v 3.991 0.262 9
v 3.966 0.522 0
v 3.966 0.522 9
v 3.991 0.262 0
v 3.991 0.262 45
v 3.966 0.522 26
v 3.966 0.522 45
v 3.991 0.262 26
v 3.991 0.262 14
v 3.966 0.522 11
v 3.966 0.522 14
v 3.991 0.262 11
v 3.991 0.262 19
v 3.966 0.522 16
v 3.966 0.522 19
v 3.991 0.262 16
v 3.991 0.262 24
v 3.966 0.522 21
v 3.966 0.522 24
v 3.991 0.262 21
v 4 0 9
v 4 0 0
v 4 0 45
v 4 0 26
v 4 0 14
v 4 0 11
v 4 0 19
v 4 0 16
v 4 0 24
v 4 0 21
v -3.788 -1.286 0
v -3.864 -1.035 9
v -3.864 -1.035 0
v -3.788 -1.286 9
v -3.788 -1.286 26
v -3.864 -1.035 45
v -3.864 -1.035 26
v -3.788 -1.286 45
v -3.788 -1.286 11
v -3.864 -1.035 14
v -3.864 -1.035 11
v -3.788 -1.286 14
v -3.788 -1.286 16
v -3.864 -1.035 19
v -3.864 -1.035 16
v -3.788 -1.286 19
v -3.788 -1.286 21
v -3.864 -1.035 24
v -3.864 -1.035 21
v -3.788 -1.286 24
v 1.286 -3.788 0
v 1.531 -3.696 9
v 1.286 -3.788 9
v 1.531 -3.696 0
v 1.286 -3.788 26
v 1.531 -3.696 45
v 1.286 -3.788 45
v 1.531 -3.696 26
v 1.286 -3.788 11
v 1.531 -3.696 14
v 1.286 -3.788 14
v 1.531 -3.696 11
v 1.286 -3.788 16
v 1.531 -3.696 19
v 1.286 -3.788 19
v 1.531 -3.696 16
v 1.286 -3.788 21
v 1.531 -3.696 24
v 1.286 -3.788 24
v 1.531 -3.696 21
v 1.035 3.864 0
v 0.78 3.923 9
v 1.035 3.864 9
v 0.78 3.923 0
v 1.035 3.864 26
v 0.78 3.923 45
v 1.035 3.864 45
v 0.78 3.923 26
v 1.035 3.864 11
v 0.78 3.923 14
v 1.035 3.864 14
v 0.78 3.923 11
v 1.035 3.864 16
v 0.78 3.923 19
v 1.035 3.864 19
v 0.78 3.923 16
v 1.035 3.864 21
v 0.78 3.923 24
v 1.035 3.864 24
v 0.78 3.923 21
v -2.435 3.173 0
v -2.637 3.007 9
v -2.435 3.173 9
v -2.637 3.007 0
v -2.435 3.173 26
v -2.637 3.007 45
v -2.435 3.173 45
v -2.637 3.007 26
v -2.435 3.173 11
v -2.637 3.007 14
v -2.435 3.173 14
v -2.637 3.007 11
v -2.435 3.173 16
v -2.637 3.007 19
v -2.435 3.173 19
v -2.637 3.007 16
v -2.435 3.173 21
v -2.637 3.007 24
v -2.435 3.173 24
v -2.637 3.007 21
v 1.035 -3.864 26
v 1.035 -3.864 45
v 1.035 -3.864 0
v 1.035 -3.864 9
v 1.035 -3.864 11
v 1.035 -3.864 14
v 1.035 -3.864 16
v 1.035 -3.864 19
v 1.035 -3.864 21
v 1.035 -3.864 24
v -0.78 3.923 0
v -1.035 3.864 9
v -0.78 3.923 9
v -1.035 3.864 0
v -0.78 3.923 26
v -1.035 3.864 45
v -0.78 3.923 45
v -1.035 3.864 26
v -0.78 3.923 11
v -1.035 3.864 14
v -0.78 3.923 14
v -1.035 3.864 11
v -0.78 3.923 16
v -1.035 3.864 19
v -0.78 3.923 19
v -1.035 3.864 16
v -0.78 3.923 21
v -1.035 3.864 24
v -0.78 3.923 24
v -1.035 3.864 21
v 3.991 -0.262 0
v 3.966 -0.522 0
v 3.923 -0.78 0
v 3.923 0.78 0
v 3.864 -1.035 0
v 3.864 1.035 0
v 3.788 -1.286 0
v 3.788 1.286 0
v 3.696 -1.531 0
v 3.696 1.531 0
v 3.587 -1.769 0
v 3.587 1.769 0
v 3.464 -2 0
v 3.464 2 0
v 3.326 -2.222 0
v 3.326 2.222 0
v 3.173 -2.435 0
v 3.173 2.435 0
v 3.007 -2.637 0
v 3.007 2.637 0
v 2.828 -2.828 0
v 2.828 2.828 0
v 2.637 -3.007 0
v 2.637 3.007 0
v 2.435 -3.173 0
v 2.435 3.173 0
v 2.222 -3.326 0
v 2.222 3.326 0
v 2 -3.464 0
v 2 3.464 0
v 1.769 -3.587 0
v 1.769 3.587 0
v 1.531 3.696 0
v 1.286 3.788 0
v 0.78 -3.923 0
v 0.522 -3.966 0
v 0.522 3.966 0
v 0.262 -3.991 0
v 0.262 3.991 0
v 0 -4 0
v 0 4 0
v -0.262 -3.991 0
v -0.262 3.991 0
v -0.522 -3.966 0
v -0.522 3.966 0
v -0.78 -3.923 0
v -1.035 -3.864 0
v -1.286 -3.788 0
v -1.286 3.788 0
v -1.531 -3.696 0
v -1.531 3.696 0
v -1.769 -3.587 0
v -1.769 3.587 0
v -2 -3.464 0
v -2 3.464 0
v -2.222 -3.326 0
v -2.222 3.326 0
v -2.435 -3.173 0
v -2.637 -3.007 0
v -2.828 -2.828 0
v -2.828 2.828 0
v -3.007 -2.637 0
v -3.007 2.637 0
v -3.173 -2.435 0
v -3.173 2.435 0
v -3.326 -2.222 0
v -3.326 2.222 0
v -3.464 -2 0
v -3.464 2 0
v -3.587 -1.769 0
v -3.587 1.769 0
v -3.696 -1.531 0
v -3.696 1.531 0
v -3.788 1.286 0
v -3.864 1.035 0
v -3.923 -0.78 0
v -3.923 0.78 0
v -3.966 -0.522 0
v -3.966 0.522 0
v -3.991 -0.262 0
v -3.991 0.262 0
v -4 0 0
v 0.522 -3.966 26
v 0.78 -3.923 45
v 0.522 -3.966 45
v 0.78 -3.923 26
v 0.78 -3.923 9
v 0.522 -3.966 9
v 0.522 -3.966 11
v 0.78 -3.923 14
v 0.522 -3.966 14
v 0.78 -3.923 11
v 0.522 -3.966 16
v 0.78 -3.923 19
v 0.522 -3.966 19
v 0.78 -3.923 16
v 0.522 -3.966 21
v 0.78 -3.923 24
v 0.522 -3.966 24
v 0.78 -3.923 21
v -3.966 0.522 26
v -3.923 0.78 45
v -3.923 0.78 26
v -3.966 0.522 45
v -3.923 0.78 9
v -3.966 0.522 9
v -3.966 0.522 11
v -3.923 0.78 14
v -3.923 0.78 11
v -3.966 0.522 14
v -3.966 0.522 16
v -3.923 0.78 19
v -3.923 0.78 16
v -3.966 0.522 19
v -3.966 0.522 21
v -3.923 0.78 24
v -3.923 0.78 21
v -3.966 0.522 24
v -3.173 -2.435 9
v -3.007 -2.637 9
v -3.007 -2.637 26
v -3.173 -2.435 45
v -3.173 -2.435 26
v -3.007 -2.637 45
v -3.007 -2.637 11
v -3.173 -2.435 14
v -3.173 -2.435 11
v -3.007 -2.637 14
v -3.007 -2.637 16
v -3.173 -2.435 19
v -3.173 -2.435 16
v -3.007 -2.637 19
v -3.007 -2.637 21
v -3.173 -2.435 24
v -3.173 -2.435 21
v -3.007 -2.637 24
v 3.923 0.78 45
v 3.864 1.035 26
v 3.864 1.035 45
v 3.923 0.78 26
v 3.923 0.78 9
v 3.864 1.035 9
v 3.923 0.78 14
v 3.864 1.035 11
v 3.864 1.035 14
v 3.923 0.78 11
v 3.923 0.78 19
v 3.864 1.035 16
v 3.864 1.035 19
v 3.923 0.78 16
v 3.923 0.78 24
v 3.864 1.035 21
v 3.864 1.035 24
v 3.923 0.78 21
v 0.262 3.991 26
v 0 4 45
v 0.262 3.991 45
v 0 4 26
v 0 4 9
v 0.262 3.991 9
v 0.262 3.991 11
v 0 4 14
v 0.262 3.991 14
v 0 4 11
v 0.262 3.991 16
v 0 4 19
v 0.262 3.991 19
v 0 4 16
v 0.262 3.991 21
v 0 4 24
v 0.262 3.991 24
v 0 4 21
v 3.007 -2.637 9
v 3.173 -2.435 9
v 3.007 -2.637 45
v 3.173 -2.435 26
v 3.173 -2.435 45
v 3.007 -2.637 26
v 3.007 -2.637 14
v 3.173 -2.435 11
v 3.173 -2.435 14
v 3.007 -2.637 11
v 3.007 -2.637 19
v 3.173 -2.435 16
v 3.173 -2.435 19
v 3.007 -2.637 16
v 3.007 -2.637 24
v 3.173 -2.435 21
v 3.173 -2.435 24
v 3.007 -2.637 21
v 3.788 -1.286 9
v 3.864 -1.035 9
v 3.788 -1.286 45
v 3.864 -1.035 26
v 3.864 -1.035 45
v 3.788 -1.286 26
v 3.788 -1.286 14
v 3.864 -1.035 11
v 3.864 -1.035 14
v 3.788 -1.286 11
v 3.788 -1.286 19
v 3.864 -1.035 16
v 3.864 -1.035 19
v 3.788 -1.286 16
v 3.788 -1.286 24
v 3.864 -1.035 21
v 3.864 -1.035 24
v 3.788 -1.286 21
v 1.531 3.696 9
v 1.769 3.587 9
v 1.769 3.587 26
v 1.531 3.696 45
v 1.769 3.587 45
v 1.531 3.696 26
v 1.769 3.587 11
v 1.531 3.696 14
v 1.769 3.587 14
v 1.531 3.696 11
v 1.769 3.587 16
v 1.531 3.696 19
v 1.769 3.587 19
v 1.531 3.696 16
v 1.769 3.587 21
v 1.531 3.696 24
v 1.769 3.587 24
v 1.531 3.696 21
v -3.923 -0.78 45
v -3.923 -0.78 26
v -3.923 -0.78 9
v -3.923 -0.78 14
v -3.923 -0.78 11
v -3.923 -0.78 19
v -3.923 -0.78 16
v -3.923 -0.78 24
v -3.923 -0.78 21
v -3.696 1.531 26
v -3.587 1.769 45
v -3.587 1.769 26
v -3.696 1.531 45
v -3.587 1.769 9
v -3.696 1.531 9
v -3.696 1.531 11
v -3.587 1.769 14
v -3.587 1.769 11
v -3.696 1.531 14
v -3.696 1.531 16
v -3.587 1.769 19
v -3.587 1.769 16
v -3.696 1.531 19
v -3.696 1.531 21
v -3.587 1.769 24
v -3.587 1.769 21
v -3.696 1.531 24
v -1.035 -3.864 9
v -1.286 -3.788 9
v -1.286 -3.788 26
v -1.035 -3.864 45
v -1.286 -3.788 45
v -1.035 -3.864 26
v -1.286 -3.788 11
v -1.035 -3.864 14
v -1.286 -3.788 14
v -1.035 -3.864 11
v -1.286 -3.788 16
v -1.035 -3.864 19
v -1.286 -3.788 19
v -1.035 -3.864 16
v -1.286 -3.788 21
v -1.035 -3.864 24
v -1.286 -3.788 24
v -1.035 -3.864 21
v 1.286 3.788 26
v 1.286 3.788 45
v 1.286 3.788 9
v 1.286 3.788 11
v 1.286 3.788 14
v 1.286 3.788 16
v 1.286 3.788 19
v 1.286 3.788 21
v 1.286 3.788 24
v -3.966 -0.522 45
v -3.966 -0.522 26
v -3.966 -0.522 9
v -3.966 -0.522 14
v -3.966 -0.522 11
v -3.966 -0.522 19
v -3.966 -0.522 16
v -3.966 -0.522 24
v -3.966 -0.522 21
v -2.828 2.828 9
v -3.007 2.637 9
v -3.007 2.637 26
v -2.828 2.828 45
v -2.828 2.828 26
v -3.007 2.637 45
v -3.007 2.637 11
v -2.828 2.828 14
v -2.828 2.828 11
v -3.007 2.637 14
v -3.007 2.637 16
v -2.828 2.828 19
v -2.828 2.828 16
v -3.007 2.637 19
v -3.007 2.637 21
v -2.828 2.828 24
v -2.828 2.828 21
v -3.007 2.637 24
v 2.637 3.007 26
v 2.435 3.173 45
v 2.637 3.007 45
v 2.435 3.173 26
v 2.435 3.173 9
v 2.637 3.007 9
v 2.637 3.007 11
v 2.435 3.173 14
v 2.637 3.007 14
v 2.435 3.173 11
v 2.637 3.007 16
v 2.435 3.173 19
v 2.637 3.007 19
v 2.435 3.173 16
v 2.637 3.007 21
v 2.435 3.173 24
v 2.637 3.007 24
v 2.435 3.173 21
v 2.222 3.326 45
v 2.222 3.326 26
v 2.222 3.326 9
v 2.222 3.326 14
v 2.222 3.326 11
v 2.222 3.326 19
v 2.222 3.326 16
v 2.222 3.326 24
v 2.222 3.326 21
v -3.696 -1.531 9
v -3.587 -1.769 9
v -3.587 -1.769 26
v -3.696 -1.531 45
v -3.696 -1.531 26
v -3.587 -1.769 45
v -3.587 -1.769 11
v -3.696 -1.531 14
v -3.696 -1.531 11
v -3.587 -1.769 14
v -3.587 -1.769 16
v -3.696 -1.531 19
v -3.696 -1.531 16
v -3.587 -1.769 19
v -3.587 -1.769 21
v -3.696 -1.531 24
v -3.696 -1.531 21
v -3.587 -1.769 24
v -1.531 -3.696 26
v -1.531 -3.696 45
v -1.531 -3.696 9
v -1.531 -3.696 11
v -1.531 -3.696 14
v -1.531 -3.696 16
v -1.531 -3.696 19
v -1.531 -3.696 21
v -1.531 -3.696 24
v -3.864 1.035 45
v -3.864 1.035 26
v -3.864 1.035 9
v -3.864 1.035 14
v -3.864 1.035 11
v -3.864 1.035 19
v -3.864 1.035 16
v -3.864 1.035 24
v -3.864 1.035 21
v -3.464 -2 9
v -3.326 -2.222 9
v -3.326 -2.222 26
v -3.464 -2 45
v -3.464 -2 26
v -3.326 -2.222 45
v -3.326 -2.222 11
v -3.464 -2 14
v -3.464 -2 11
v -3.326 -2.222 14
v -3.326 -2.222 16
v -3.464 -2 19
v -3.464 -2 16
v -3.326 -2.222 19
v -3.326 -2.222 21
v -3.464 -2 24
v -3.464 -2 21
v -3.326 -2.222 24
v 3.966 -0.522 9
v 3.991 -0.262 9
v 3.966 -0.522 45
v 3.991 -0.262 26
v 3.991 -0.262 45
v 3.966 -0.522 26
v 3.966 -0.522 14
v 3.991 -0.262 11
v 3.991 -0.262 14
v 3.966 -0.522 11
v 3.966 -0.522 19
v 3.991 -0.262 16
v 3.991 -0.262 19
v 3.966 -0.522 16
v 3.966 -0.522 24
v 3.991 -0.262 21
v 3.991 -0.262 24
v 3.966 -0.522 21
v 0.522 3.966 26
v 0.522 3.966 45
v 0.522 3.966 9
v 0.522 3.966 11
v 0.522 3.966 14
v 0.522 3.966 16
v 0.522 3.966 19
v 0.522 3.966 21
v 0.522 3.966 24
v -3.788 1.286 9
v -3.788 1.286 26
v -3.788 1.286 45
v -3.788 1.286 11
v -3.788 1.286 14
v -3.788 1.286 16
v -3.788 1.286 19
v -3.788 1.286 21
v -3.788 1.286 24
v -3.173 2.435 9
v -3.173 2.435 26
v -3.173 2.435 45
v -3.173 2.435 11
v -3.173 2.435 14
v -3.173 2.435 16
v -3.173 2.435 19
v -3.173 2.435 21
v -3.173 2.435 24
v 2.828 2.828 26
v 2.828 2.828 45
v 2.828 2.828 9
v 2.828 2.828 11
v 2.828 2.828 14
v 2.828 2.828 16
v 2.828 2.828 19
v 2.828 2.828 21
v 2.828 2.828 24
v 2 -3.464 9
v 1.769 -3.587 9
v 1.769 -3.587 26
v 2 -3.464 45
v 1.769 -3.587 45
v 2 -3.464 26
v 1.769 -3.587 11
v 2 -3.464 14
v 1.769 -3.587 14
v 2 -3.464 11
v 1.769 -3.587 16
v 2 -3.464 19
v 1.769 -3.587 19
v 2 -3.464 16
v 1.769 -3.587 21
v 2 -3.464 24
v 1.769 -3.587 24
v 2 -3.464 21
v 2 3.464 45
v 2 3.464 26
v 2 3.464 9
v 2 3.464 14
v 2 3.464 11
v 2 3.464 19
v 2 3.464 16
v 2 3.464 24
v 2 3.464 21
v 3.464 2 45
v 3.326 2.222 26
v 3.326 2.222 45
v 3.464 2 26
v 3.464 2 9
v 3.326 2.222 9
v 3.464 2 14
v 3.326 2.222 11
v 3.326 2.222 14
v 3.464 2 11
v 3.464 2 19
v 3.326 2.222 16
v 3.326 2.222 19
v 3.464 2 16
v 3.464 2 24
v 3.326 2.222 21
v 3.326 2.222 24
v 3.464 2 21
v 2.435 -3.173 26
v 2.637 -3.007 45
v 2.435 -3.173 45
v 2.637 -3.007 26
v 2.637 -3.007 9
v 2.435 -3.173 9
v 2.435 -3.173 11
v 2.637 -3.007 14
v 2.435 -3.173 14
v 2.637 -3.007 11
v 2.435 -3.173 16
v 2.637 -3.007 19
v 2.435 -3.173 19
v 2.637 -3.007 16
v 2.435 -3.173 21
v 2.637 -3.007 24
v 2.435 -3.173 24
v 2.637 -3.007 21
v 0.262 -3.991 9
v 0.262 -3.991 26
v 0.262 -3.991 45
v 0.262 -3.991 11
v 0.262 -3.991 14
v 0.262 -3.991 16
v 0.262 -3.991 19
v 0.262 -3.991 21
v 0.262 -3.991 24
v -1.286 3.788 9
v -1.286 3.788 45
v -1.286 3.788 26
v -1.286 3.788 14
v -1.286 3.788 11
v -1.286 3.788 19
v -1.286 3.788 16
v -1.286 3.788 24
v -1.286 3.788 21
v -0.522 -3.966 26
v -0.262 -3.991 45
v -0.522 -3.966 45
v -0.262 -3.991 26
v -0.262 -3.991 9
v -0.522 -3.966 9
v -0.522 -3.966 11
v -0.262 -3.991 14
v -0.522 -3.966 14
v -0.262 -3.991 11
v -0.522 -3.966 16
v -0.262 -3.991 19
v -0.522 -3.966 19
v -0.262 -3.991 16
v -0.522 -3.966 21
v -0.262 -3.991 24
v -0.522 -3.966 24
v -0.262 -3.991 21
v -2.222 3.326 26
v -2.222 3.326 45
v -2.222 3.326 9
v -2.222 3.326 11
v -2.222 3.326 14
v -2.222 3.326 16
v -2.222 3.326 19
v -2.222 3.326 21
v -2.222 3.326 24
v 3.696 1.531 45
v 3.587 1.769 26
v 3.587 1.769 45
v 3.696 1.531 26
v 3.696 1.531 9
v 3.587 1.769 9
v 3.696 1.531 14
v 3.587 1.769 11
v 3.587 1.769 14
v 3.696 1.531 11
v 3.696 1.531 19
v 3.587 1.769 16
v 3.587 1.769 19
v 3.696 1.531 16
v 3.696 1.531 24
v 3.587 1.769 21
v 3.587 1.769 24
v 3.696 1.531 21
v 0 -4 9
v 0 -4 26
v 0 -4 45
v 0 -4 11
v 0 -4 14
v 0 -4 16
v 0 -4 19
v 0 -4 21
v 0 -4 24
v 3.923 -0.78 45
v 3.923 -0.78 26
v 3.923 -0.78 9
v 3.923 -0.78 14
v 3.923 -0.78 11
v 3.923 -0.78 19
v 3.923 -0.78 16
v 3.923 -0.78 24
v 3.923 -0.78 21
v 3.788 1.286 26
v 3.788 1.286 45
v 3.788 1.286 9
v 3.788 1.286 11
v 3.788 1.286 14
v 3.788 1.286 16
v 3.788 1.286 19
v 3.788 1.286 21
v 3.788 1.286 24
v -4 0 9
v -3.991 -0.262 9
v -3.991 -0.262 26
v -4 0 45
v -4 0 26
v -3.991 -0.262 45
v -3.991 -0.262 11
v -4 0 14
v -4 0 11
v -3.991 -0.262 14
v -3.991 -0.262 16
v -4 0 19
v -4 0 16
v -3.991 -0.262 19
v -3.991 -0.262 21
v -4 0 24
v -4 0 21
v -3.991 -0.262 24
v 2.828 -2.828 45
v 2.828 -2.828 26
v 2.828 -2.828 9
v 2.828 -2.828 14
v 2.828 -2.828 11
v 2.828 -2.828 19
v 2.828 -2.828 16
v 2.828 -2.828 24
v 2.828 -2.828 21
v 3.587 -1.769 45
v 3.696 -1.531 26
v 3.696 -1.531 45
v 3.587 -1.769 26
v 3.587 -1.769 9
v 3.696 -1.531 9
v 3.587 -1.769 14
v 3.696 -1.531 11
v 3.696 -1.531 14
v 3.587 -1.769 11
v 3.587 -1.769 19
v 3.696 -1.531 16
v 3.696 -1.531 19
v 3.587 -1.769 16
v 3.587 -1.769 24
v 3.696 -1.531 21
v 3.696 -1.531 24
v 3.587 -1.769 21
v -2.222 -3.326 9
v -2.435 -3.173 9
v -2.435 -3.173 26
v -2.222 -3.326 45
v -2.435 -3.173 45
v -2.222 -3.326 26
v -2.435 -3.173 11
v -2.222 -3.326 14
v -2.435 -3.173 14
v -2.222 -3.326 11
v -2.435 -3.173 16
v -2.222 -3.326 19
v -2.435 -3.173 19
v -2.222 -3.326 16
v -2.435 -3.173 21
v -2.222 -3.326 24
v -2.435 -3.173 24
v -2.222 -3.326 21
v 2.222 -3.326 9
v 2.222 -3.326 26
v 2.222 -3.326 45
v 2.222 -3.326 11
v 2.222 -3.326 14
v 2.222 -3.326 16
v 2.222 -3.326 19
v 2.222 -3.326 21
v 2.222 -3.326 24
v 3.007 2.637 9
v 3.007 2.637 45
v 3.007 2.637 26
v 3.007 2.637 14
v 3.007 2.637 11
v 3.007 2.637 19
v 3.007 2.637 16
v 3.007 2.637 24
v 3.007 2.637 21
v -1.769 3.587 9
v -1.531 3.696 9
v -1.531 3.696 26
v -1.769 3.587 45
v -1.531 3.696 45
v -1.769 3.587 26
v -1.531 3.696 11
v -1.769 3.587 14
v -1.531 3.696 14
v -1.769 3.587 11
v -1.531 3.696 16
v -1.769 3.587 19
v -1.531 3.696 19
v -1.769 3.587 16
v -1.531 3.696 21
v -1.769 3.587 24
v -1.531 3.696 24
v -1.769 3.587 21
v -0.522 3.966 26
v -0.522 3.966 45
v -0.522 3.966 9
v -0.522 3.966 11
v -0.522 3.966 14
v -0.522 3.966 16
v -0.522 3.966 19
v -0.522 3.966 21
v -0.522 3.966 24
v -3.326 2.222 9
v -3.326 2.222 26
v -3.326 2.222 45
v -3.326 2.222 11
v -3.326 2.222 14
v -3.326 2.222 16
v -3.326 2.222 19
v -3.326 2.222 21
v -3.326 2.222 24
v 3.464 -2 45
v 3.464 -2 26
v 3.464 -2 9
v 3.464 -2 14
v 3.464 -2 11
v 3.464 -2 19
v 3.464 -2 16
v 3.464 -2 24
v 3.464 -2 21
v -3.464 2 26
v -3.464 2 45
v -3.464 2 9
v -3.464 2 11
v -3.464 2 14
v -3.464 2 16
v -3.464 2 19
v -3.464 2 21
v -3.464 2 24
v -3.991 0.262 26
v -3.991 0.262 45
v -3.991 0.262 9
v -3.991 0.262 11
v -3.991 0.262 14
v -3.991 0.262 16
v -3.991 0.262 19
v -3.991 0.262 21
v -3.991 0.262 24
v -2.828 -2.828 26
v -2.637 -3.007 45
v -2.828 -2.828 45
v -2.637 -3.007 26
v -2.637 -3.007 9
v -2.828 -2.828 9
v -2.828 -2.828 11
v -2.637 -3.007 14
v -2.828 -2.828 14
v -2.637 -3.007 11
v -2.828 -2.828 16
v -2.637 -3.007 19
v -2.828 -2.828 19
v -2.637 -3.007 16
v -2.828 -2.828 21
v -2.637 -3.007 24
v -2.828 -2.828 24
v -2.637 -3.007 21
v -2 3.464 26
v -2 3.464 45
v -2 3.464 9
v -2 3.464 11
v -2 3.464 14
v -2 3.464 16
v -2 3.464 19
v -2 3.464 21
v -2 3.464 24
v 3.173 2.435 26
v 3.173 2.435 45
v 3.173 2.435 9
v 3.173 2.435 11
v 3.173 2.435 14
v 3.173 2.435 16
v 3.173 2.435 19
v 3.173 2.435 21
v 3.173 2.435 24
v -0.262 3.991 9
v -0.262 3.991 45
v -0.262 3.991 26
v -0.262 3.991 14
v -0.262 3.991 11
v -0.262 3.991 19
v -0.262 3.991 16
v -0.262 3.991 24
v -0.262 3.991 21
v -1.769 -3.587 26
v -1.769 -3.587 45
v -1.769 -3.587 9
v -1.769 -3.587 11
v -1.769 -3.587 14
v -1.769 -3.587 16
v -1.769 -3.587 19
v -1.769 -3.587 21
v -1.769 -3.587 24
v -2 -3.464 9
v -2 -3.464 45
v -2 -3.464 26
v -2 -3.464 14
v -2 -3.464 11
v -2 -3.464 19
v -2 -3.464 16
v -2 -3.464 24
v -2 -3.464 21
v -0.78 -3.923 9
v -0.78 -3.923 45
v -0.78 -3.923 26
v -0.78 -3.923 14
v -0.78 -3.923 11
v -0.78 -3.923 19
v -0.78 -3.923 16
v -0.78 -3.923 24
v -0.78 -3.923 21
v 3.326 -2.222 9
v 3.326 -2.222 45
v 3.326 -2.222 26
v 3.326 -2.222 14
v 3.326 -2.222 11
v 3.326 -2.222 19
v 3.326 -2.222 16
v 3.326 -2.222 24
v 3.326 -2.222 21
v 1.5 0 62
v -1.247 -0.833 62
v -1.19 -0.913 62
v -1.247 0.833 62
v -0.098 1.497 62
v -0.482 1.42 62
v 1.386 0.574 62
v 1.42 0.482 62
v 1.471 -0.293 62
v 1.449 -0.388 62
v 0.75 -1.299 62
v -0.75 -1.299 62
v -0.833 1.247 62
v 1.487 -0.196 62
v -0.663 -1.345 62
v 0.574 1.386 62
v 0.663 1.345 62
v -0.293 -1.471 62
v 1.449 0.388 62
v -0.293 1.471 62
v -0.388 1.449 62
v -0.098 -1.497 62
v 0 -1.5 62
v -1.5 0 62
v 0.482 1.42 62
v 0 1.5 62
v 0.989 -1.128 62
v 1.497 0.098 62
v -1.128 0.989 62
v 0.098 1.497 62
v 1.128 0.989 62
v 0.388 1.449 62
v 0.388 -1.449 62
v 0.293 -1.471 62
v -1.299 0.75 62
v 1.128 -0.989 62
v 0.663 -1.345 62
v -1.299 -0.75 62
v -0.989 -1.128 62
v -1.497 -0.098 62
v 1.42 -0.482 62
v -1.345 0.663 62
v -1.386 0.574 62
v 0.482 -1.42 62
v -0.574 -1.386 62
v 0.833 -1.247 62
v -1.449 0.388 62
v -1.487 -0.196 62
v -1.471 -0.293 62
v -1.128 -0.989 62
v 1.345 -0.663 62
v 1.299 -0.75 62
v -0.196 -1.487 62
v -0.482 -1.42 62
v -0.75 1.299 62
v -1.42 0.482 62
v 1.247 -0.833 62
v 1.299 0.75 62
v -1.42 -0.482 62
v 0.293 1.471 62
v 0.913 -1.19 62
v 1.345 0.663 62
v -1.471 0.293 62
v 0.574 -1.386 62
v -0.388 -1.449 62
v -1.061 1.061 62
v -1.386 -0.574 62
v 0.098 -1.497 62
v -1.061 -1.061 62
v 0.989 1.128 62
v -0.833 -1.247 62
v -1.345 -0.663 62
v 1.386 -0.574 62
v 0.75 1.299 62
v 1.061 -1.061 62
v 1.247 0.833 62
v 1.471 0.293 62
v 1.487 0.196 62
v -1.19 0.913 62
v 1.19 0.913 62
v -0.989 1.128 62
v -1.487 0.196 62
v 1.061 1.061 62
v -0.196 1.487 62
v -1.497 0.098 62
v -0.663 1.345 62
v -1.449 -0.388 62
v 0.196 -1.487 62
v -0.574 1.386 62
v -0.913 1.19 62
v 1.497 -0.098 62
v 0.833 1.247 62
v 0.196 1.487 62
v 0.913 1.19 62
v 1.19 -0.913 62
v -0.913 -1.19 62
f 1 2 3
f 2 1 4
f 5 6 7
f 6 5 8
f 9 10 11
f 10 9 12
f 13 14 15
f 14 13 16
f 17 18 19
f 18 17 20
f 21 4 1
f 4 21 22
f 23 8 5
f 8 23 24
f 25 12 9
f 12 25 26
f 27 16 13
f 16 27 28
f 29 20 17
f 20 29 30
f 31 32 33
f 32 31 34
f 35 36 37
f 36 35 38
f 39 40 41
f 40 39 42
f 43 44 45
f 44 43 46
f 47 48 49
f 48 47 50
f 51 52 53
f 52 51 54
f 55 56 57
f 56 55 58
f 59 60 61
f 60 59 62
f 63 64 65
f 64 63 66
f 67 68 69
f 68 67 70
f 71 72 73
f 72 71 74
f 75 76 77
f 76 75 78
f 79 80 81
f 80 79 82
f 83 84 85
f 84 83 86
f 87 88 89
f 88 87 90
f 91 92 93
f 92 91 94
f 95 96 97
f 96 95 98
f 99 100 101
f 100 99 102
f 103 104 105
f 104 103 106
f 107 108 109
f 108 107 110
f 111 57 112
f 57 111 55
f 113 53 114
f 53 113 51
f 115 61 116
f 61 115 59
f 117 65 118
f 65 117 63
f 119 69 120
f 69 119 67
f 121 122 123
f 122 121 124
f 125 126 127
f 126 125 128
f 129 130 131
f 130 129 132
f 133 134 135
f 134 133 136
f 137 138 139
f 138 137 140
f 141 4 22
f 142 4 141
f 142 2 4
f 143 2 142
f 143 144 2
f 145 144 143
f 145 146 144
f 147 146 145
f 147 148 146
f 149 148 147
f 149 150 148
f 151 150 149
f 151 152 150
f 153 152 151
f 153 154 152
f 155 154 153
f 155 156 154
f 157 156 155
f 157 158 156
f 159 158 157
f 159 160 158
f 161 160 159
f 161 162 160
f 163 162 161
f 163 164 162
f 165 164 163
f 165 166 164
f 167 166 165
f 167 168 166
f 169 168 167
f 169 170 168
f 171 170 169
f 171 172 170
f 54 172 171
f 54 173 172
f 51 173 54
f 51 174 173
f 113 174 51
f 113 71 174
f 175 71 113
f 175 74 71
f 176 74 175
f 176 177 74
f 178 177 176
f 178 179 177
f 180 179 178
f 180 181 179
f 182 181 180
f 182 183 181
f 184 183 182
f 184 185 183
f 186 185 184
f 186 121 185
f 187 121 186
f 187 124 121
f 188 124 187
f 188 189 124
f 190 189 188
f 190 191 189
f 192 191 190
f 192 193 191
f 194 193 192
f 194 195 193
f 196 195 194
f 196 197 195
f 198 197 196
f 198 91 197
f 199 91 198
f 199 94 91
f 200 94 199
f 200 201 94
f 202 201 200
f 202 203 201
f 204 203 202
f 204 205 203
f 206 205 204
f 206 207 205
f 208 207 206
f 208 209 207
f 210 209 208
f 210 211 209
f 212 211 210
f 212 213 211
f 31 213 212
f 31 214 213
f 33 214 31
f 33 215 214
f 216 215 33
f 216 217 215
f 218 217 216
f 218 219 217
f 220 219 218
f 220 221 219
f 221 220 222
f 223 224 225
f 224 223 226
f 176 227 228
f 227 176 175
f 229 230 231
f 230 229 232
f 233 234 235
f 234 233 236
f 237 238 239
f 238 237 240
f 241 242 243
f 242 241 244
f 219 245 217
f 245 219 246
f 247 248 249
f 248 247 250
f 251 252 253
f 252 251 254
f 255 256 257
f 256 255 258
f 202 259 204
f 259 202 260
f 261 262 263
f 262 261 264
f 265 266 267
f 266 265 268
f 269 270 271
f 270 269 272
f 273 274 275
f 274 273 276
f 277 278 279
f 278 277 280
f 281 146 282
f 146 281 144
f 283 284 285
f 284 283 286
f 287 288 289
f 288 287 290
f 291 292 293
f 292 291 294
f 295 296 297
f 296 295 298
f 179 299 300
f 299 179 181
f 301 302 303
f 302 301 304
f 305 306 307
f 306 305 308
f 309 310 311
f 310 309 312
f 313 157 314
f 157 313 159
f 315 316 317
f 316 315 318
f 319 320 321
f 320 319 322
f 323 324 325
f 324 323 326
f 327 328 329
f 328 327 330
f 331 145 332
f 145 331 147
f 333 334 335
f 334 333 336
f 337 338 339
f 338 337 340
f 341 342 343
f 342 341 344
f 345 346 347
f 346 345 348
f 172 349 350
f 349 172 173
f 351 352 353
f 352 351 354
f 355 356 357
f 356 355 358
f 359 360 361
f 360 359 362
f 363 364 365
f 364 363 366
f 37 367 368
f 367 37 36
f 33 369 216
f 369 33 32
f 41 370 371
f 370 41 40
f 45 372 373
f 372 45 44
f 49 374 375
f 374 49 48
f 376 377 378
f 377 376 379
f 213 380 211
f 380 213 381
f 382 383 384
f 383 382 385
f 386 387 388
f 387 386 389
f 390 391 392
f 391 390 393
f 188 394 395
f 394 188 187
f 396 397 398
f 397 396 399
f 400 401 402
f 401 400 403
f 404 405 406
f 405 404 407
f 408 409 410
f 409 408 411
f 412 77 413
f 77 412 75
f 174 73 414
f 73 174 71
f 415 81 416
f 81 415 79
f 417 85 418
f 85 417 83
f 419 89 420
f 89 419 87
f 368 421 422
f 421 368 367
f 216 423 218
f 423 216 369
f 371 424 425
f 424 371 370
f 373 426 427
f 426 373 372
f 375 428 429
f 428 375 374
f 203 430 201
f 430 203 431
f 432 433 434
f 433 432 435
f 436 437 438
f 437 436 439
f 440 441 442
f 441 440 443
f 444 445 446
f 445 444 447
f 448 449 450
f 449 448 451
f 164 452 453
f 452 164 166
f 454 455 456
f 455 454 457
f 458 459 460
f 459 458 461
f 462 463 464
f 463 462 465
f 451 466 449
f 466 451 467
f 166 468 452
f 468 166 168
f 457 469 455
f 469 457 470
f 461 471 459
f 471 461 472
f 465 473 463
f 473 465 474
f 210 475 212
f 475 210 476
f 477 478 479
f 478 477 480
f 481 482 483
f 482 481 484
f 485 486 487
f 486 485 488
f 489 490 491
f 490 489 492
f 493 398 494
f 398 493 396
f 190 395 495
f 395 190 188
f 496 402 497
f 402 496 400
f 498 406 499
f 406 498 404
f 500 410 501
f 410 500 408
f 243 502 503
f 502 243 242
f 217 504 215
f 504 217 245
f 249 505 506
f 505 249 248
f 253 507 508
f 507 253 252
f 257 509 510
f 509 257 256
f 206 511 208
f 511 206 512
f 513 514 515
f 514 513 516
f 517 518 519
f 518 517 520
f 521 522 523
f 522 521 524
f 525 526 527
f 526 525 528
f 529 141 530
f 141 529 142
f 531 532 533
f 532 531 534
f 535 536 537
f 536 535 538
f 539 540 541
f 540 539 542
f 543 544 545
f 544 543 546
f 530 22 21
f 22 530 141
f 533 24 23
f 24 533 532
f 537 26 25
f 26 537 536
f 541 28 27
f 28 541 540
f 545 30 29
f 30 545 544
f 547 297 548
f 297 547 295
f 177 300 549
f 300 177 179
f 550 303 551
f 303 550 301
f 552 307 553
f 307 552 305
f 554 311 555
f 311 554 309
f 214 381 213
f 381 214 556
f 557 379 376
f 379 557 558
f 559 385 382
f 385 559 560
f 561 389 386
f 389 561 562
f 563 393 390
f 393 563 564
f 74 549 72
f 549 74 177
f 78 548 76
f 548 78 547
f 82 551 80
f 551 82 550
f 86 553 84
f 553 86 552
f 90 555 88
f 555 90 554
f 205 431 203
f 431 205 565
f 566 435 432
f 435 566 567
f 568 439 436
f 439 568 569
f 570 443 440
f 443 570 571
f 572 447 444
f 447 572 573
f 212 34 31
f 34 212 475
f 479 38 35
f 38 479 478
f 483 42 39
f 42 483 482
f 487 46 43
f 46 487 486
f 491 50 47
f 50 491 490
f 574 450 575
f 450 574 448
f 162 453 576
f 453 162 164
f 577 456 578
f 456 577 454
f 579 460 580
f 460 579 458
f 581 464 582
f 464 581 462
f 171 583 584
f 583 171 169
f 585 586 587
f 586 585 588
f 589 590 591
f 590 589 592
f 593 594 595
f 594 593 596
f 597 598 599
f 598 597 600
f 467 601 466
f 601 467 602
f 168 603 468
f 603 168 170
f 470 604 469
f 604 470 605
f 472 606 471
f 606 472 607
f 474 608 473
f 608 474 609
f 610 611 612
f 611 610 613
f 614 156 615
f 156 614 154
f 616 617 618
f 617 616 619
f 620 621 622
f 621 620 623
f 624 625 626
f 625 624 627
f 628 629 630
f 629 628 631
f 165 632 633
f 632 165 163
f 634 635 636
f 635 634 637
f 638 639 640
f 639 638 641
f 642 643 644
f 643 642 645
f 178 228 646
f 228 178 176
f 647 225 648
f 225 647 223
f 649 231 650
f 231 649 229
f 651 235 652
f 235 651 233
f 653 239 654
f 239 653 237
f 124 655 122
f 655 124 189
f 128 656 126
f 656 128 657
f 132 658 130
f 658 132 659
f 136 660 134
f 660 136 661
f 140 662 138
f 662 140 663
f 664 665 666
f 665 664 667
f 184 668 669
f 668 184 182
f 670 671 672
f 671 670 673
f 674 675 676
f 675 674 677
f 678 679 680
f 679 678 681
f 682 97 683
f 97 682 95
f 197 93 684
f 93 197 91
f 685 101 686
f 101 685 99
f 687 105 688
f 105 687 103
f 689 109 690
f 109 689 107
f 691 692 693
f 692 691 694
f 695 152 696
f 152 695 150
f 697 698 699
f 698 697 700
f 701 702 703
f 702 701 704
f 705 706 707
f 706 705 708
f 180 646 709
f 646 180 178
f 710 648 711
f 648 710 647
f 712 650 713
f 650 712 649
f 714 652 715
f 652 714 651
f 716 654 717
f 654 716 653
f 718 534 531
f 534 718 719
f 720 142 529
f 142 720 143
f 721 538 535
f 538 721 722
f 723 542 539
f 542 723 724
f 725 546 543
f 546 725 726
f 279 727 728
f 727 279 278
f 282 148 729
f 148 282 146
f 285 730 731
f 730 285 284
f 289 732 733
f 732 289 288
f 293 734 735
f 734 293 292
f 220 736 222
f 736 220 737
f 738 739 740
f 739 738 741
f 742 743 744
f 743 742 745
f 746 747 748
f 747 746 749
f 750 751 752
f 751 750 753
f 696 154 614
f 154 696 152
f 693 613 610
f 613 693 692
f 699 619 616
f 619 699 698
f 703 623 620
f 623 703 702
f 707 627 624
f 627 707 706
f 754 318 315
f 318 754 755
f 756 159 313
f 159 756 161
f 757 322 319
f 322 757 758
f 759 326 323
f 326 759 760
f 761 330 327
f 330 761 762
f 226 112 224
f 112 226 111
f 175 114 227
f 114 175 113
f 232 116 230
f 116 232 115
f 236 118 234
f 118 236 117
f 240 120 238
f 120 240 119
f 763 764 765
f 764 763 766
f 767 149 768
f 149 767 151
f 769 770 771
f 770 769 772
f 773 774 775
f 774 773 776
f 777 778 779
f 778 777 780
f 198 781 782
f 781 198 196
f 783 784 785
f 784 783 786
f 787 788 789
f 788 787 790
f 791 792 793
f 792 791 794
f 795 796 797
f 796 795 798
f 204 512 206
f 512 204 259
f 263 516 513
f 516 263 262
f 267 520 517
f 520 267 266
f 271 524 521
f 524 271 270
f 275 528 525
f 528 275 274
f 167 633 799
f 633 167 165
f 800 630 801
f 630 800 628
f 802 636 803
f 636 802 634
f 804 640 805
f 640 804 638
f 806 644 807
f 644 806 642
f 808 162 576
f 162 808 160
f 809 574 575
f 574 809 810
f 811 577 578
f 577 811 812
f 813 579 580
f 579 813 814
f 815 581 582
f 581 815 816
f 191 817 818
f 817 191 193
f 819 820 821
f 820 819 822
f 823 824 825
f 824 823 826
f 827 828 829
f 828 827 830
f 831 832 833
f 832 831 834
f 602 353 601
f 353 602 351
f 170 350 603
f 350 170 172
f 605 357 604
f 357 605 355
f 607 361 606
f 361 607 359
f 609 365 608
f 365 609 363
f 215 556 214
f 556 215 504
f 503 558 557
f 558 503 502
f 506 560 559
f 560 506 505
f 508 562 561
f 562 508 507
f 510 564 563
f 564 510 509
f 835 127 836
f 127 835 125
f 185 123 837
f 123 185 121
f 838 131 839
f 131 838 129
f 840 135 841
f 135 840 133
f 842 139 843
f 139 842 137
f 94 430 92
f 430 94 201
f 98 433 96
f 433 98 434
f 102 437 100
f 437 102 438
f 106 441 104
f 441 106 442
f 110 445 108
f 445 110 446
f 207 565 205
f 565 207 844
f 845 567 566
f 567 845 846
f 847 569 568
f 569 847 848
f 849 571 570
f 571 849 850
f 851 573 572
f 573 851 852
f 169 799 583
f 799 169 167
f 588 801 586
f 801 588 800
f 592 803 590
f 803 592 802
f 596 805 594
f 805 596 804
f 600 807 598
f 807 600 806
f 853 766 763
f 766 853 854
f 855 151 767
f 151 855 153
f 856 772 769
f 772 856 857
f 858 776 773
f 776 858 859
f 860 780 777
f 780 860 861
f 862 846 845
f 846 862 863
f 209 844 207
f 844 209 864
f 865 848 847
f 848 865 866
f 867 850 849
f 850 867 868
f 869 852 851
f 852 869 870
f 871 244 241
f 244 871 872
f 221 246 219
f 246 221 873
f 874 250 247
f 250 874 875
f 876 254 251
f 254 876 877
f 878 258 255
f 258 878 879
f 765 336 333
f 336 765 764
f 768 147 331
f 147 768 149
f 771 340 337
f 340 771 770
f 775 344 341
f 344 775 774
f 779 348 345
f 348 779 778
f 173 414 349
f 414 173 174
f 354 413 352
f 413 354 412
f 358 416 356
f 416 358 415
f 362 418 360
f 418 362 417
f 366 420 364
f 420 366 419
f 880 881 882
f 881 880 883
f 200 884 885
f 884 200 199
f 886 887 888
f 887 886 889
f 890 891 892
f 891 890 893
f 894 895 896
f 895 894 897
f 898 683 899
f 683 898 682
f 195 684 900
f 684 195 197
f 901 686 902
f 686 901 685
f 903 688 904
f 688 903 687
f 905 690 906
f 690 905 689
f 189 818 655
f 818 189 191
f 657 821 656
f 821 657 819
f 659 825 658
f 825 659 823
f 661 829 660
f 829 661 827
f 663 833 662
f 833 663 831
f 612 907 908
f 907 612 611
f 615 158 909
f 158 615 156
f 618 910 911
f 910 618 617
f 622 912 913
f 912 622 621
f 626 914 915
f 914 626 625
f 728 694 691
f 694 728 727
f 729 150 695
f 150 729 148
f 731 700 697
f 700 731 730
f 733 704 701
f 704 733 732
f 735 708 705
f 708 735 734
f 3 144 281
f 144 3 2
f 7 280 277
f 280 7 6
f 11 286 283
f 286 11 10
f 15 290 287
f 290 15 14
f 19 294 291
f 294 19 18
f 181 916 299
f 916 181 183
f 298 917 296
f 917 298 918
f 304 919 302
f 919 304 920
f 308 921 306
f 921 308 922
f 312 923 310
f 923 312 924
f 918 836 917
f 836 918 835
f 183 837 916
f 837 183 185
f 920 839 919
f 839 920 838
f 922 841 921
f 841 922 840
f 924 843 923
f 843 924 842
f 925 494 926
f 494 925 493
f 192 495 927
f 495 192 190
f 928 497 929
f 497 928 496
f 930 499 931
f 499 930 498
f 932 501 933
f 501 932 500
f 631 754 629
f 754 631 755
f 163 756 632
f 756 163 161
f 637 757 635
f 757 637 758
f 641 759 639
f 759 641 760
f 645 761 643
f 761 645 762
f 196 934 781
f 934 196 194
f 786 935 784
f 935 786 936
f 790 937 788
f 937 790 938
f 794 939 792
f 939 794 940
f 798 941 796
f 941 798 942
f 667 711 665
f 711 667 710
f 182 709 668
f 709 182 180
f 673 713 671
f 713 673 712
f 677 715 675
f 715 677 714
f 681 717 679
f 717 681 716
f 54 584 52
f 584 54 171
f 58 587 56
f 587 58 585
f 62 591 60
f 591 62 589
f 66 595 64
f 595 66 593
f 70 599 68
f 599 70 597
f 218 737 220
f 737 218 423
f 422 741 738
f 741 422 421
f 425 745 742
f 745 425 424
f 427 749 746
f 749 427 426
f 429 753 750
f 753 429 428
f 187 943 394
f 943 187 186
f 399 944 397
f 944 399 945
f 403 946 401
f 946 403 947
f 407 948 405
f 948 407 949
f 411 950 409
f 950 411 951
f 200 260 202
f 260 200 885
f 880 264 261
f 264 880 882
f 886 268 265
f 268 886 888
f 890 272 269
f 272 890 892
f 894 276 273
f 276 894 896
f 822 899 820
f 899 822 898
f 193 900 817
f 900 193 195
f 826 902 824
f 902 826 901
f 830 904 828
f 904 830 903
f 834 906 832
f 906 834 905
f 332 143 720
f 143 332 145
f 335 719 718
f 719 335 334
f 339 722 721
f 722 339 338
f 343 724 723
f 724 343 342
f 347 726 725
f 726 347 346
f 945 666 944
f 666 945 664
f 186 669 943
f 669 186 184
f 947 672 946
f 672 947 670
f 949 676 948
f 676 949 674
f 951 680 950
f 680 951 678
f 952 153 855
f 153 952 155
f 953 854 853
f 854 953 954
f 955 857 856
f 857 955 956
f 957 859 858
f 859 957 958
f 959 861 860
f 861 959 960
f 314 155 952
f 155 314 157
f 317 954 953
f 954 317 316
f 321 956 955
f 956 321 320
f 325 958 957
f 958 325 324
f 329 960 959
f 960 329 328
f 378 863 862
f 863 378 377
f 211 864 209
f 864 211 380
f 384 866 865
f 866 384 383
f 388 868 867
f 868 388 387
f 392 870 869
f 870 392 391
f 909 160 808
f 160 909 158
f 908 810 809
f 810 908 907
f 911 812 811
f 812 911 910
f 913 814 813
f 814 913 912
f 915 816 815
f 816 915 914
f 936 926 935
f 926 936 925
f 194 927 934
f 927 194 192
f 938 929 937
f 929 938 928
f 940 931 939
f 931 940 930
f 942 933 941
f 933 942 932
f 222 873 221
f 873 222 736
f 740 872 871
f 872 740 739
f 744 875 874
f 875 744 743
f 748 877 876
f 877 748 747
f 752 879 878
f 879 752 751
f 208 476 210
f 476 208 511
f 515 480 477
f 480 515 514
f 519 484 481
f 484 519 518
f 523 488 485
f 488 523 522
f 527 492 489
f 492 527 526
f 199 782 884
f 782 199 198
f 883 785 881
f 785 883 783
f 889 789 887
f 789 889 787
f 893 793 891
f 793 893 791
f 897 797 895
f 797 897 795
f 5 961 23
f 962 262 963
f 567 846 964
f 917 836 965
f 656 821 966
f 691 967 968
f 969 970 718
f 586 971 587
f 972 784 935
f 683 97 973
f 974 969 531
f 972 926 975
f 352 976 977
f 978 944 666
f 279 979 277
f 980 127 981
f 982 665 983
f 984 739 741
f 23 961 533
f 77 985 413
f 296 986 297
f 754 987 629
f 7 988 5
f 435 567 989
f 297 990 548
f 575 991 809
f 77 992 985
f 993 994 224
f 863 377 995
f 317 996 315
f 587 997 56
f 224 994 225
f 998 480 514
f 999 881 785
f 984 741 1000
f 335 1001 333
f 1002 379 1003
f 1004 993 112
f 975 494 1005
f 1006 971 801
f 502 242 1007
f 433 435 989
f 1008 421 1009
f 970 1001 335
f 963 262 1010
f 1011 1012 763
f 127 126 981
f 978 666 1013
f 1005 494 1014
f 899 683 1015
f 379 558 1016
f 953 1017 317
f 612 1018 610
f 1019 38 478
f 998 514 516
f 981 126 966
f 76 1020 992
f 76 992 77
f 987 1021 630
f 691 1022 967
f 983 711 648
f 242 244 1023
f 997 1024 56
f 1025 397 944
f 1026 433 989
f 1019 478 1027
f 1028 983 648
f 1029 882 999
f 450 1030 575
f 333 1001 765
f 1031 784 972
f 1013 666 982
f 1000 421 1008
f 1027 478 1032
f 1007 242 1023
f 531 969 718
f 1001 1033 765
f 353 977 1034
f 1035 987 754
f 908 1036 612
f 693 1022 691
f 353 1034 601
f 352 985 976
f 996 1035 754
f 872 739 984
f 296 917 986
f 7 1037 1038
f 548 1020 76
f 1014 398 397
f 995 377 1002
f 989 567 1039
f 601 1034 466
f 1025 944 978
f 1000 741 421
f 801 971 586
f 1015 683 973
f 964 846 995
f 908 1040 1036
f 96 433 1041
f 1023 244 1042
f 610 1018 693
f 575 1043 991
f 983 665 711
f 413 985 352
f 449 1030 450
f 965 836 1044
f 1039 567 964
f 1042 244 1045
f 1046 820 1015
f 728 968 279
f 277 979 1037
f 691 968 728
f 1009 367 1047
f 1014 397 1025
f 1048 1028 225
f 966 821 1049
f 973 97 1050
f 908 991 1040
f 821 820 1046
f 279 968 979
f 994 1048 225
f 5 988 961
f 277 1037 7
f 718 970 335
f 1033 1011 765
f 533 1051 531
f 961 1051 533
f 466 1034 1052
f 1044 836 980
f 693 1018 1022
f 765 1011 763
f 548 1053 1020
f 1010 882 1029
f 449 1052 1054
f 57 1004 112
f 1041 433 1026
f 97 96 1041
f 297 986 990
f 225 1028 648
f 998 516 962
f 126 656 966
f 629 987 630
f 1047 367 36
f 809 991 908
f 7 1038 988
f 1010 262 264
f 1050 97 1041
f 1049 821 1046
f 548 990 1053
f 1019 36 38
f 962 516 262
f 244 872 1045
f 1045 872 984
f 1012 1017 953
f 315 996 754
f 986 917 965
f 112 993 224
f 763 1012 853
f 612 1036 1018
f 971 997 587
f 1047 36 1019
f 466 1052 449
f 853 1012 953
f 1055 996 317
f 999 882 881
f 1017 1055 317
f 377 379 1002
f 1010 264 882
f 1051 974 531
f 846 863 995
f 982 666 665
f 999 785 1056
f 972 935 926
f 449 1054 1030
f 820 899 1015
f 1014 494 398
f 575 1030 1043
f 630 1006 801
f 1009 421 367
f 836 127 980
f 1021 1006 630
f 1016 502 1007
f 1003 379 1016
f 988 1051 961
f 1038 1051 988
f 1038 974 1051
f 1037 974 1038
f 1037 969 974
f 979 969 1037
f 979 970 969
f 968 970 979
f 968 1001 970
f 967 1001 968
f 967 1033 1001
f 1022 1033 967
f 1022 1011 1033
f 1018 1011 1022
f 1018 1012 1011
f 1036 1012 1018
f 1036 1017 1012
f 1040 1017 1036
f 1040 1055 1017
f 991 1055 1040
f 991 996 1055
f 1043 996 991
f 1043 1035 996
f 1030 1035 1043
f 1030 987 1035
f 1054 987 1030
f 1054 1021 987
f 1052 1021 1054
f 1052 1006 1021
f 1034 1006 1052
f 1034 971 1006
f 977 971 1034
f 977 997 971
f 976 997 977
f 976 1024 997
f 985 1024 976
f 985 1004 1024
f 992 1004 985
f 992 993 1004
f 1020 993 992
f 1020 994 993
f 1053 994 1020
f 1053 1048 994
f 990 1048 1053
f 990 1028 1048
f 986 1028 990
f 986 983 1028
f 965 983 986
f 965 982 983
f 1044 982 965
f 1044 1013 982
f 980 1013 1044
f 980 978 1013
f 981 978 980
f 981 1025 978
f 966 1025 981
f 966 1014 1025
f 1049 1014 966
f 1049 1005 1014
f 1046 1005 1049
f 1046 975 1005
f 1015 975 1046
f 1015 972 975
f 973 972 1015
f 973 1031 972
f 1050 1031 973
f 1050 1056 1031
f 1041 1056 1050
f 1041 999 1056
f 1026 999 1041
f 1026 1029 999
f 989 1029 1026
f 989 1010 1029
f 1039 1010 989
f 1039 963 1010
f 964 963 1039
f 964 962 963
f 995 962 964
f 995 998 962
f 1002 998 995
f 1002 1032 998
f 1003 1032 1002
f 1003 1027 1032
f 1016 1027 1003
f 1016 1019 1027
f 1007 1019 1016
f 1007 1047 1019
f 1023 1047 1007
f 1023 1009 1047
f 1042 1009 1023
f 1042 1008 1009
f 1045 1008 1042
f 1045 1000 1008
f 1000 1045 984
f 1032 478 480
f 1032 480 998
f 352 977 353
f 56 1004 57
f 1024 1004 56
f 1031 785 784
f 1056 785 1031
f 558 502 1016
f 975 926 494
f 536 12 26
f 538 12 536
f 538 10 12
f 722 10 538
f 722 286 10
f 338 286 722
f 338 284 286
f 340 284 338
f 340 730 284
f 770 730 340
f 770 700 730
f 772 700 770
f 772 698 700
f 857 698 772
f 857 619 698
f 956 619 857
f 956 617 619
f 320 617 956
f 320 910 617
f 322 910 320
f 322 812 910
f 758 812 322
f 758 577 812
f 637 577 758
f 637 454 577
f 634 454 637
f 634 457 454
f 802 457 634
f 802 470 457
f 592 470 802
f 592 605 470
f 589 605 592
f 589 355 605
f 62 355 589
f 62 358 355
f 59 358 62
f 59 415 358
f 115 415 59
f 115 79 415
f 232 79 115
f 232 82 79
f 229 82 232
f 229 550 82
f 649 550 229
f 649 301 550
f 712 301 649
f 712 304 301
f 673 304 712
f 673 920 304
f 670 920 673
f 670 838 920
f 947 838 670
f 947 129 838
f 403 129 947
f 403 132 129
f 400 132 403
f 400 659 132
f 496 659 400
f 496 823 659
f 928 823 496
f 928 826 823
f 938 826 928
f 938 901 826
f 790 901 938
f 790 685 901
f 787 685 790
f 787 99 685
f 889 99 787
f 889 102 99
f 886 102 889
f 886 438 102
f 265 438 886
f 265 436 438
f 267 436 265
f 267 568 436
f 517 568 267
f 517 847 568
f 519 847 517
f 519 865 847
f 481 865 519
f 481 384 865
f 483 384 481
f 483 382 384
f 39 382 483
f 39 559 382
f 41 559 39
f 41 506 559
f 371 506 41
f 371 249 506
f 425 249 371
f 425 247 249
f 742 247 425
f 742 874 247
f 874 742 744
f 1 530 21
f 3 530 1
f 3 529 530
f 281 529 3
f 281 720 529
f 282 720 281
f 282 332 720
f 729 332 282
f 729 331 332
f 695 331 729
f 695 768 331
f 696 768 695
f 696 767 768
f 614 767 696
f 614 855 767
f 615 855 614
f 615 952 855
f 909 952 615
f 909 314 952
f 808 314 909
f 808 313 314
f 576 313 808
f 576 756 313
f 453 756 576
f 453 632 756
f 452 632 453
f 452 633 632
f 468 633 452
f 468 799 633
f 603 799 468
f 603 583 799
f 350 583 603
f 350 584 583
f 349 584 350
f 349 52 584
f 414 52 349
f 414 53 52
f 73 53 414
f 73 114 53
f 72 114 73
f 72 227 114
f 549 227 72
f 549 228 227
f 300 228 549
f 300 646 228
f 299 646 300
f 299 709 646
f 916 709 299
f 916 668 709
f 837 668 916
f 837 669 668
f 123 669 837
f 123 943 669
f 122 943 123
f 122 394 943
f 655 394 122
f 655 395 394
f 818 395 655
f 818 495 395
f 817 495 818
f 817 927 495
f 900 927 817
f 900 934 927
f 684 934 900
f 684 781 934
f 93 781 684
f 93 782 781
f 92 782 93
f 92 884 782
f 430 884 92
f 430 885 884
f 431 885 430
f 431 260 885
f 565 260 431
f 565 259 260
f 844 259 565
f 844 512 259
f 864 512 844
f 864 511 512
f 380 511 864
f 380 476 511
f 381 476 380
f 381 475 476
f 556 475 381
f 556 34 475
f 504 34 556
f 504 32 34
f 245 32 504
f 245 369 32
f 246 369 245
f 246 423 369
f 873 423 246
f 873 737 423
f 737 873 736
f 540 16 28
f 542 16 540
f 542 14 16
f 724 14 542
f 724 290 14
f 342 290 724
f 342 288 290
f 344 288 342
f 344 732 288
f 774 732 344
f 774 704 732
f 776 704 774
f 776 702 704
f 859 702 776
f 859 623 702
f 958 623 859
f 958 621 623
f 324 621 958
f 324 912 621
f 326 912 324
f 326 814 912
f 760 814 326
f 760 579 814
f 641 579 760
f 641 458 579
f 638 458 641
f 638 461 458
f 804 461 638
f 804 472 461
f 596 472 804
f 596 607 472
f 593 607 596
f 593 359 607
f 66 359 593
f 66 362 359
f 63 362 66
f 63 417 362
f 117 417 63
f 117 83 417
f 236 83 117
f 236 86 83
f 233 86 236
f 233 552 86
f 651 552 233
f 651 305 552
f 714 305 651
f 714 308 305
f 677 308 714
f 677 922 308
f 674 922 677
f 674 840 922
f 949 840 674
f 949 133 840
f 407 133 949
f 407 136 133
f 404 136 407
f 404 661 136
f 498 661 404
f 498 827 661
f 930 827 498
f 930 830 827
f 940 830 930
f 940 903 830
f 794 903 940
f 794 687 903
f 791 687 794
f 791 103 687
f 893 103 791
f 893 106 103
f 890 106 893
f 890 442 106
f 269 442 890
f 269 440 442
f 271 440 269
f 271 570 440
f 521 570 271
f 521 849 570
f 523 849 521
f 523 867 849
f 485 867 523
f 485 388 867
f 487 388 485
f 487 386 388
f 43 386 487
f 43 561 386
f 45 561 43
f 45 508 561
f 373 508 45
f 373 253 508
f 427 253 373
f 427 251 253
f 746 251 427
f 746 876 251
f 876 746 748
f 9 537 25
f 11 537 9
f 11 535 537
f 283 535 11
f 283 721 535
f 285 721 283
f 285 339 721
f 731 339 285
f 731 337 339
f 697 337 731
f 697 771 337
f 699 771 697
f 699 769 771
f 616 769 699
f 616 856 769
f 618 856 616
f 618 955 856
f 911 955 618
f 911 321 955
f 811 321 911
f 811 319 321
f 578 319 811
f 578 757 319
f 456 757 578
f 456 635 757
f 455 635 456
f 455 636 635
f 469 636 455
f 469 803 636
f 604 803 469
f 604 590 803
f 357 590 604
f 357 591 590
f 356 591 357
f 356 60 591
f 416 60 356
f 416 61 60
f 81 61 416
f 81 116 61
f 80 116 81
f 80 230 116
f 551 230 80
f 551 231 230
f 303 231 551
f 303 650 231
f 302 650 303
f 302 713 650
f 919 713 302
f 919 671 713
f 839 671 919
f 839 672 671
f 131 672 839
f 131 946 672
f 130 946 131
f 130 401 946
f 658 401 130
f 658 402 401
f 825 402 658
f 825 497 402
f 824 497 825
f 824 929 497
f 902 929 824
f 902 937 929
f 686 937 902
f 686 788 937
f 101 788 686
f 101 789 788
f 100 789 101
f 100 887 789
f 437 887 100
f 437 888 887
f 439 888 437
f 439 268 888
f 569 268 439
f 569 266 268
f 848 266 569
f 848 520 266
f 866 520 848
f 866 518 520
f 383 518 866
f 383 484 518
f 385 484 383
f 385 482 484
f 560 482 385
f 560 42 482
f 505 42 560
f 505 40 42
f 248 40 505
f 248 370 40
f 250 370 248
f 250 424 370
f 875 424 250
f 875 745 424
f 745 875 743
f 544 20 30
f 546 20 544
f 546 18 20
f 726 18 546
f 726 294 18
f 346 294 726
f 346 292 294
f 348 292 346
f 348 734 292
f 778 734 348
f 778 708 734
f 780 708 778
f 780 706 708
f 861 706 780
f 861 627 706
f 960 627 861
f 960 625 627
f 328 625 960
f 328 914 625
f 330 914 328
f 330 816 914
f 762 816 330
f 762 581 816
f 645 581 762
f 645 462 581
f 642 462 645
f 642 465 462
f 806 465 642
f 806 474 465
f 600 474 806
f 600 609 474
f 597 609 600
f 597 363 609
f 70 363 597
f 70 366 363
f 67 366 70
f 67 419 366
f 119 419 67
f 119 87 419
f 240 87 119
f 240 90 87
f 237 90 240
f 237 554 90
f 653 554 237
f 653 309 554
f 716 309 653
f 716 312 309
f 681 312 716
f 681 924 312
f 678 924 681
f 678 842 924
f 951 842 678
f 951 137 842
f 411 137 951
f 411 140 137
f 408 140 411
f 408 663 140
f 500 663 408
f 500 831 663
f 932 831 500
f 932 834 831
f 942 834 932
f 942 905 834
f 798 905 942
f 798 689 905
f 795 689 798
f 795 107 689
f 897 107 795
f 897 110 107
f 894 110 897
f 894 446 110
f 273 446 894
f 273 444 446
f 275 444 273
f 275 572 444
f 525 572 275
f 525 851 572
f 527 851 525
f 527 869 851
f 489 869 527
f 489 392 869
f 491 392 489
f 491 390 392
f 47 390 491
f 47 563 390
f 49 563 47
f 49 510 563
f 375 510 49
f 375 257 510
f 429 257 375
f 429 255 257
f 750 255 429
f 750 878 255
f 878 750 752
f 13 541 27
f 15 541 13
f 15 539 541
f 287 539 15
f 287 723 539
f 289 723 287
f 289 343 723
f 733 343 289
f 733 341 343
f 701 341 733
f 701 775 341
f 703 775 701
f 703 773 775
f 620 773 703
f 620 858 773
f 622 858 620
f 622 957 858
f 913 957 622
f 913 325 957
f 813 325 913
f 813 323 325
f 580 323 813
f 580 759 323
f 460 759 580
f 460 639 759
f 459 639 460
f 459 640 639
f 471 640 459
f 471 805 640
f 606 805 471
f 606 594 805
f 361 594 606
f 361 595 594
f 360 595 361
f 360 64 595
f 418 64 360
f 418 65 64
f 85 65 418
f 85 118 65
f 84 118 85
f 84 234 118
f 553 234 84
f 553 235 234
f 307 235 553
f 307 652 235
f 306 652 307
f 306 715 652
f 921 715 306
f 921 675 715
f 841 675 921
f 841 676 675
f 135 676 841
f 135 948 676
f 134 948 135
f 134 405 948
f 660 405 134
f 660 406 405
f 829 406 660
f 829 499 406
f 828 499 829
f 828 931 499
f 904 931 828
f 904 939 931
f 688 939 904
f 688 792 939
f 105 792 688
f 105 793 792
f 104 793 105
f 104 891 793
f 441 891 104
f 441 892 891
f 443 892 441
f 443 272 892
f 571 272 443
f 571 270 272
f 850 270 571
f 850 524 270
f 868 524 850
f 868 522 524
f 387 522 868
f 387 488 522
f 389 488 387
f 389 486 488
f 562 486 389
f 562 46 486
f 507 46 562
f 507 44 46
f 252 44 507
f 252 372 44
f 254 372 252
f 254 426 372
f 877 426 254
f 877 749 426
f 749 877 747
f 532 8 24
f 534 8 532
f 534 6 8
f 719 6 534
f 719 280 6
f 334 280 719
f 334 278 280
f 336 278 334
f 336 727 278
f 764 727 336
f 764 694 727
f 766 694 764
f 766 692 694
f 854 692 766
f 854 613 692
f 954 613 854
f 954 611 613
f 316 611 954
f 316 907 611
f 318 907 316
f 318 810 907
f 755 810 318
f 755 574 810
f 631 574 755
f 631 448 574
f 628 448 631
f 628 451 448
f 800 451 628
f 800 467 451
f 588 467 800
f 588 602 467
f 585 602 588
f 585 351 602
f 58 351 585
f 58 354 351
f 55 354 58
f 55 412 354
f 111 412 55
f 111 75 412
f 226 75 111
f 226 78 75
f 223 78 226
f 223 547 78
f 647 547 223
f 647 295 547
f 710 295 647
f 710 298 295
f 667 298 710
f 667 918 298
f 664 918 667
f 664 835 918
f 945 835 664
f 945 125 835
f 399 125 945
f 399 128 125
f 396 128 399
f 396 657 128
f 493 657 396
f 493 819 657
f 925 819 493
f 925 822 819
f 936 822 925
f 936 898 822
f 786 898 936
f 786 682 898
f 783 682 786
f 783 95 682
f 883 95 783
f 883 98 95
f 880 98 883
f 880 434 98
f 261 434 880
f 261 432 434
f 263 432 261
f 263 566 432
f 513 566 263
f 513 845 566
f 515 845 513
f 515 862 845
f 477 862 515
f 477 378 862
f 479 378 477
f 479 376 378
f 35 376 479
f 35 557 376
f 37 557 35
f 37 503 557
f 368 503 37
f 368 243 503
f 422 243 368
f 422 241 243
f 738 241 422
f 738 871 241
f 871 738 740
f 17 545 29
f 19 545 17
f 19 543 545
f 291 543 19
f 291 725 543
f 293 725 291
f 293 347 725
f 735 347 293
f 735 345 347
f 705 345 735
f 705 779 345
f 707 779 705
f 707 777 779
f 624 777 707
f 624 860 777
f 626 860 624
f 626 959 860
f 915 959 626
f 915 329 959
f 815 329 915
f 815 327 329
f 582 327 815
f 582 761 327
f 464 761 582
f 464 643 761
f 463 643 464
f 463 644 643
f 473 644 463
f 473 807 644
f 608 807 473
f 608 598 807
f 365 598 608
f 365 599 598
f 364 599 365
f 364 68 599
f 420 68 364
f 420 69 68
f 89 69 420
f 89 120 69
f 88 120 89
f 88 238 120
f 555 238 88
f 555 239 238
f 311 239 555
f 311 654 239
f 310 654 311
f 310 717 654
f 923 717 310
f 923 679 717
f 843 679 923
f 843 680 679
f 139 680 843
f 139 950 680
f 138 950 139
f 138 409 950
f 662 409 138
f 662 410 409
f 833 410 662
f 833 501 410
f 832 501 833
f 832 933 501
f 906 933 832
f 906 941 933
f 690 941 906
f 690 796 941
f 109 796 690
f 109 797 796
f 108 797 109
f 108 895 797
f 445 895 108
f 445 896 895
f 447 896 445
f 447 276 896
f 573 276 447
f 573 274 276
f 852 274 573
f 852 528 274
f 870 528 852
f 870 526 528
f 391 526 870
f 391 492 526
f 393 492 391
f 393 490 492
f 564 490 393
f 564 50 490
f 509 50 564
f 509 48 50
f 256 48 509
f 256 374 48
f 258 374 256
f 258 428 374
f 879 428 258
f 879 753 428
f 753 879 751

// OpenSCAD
// Pestle for grinding tissue inside a 1.5 mL microcentrifuge tube
// Print orientation: standing upright on the bed, builds up +Z

$fn = 96;

// ---- Dimensions (mm) ----
handle_d      = 8;    // handle diameter
handle_h      = 45;   // handle length (z = 0 to 45)
cone_top_d    = 8;    // cone diameter where it meets the handle
cone_bottom_d = 3;    // cone tip diameter (z = 62)
cone_h        = 17;   // cone height (z = 45 to 62)
sphere_d      = 3;    // tip sphere diameter
sphere_z      = 62;   // sphere centre height

groove_count  = 4;    // number of circumferential grooves
groove_w      = 2;    // groove width along Z
groove_depth  = 1;    // groove depth into the handle
groove_z      = [10, 15, 20, 25]; // groove centre heights

eps           = 0.5;  // overshoot for clean boolean cuts

// ---- Model ----
difference() {
    union() {
        // Handle
        cylinder(d = handle_d, h = handle_h);
        // Cone (tapers from 8 mm at z = 45 to 3 mm at z = 62)
        translate([0, 0, handle_h])
            cylinder(d1 = cone_top_d, d2 = cone_bottom_d, h = cone_h);
        // Rounded tip sphere
        translate([0, 0, sphere_z - sphere_d / 2])
            sphere(d = sphere_d);
    }
    // Grooves cut into the handle
    for (z = groove_z)
        translate([0, 0, z - groove_w / 2])
            cylinder(d = handle_d + 2 * eps, h = groove_w);
}
